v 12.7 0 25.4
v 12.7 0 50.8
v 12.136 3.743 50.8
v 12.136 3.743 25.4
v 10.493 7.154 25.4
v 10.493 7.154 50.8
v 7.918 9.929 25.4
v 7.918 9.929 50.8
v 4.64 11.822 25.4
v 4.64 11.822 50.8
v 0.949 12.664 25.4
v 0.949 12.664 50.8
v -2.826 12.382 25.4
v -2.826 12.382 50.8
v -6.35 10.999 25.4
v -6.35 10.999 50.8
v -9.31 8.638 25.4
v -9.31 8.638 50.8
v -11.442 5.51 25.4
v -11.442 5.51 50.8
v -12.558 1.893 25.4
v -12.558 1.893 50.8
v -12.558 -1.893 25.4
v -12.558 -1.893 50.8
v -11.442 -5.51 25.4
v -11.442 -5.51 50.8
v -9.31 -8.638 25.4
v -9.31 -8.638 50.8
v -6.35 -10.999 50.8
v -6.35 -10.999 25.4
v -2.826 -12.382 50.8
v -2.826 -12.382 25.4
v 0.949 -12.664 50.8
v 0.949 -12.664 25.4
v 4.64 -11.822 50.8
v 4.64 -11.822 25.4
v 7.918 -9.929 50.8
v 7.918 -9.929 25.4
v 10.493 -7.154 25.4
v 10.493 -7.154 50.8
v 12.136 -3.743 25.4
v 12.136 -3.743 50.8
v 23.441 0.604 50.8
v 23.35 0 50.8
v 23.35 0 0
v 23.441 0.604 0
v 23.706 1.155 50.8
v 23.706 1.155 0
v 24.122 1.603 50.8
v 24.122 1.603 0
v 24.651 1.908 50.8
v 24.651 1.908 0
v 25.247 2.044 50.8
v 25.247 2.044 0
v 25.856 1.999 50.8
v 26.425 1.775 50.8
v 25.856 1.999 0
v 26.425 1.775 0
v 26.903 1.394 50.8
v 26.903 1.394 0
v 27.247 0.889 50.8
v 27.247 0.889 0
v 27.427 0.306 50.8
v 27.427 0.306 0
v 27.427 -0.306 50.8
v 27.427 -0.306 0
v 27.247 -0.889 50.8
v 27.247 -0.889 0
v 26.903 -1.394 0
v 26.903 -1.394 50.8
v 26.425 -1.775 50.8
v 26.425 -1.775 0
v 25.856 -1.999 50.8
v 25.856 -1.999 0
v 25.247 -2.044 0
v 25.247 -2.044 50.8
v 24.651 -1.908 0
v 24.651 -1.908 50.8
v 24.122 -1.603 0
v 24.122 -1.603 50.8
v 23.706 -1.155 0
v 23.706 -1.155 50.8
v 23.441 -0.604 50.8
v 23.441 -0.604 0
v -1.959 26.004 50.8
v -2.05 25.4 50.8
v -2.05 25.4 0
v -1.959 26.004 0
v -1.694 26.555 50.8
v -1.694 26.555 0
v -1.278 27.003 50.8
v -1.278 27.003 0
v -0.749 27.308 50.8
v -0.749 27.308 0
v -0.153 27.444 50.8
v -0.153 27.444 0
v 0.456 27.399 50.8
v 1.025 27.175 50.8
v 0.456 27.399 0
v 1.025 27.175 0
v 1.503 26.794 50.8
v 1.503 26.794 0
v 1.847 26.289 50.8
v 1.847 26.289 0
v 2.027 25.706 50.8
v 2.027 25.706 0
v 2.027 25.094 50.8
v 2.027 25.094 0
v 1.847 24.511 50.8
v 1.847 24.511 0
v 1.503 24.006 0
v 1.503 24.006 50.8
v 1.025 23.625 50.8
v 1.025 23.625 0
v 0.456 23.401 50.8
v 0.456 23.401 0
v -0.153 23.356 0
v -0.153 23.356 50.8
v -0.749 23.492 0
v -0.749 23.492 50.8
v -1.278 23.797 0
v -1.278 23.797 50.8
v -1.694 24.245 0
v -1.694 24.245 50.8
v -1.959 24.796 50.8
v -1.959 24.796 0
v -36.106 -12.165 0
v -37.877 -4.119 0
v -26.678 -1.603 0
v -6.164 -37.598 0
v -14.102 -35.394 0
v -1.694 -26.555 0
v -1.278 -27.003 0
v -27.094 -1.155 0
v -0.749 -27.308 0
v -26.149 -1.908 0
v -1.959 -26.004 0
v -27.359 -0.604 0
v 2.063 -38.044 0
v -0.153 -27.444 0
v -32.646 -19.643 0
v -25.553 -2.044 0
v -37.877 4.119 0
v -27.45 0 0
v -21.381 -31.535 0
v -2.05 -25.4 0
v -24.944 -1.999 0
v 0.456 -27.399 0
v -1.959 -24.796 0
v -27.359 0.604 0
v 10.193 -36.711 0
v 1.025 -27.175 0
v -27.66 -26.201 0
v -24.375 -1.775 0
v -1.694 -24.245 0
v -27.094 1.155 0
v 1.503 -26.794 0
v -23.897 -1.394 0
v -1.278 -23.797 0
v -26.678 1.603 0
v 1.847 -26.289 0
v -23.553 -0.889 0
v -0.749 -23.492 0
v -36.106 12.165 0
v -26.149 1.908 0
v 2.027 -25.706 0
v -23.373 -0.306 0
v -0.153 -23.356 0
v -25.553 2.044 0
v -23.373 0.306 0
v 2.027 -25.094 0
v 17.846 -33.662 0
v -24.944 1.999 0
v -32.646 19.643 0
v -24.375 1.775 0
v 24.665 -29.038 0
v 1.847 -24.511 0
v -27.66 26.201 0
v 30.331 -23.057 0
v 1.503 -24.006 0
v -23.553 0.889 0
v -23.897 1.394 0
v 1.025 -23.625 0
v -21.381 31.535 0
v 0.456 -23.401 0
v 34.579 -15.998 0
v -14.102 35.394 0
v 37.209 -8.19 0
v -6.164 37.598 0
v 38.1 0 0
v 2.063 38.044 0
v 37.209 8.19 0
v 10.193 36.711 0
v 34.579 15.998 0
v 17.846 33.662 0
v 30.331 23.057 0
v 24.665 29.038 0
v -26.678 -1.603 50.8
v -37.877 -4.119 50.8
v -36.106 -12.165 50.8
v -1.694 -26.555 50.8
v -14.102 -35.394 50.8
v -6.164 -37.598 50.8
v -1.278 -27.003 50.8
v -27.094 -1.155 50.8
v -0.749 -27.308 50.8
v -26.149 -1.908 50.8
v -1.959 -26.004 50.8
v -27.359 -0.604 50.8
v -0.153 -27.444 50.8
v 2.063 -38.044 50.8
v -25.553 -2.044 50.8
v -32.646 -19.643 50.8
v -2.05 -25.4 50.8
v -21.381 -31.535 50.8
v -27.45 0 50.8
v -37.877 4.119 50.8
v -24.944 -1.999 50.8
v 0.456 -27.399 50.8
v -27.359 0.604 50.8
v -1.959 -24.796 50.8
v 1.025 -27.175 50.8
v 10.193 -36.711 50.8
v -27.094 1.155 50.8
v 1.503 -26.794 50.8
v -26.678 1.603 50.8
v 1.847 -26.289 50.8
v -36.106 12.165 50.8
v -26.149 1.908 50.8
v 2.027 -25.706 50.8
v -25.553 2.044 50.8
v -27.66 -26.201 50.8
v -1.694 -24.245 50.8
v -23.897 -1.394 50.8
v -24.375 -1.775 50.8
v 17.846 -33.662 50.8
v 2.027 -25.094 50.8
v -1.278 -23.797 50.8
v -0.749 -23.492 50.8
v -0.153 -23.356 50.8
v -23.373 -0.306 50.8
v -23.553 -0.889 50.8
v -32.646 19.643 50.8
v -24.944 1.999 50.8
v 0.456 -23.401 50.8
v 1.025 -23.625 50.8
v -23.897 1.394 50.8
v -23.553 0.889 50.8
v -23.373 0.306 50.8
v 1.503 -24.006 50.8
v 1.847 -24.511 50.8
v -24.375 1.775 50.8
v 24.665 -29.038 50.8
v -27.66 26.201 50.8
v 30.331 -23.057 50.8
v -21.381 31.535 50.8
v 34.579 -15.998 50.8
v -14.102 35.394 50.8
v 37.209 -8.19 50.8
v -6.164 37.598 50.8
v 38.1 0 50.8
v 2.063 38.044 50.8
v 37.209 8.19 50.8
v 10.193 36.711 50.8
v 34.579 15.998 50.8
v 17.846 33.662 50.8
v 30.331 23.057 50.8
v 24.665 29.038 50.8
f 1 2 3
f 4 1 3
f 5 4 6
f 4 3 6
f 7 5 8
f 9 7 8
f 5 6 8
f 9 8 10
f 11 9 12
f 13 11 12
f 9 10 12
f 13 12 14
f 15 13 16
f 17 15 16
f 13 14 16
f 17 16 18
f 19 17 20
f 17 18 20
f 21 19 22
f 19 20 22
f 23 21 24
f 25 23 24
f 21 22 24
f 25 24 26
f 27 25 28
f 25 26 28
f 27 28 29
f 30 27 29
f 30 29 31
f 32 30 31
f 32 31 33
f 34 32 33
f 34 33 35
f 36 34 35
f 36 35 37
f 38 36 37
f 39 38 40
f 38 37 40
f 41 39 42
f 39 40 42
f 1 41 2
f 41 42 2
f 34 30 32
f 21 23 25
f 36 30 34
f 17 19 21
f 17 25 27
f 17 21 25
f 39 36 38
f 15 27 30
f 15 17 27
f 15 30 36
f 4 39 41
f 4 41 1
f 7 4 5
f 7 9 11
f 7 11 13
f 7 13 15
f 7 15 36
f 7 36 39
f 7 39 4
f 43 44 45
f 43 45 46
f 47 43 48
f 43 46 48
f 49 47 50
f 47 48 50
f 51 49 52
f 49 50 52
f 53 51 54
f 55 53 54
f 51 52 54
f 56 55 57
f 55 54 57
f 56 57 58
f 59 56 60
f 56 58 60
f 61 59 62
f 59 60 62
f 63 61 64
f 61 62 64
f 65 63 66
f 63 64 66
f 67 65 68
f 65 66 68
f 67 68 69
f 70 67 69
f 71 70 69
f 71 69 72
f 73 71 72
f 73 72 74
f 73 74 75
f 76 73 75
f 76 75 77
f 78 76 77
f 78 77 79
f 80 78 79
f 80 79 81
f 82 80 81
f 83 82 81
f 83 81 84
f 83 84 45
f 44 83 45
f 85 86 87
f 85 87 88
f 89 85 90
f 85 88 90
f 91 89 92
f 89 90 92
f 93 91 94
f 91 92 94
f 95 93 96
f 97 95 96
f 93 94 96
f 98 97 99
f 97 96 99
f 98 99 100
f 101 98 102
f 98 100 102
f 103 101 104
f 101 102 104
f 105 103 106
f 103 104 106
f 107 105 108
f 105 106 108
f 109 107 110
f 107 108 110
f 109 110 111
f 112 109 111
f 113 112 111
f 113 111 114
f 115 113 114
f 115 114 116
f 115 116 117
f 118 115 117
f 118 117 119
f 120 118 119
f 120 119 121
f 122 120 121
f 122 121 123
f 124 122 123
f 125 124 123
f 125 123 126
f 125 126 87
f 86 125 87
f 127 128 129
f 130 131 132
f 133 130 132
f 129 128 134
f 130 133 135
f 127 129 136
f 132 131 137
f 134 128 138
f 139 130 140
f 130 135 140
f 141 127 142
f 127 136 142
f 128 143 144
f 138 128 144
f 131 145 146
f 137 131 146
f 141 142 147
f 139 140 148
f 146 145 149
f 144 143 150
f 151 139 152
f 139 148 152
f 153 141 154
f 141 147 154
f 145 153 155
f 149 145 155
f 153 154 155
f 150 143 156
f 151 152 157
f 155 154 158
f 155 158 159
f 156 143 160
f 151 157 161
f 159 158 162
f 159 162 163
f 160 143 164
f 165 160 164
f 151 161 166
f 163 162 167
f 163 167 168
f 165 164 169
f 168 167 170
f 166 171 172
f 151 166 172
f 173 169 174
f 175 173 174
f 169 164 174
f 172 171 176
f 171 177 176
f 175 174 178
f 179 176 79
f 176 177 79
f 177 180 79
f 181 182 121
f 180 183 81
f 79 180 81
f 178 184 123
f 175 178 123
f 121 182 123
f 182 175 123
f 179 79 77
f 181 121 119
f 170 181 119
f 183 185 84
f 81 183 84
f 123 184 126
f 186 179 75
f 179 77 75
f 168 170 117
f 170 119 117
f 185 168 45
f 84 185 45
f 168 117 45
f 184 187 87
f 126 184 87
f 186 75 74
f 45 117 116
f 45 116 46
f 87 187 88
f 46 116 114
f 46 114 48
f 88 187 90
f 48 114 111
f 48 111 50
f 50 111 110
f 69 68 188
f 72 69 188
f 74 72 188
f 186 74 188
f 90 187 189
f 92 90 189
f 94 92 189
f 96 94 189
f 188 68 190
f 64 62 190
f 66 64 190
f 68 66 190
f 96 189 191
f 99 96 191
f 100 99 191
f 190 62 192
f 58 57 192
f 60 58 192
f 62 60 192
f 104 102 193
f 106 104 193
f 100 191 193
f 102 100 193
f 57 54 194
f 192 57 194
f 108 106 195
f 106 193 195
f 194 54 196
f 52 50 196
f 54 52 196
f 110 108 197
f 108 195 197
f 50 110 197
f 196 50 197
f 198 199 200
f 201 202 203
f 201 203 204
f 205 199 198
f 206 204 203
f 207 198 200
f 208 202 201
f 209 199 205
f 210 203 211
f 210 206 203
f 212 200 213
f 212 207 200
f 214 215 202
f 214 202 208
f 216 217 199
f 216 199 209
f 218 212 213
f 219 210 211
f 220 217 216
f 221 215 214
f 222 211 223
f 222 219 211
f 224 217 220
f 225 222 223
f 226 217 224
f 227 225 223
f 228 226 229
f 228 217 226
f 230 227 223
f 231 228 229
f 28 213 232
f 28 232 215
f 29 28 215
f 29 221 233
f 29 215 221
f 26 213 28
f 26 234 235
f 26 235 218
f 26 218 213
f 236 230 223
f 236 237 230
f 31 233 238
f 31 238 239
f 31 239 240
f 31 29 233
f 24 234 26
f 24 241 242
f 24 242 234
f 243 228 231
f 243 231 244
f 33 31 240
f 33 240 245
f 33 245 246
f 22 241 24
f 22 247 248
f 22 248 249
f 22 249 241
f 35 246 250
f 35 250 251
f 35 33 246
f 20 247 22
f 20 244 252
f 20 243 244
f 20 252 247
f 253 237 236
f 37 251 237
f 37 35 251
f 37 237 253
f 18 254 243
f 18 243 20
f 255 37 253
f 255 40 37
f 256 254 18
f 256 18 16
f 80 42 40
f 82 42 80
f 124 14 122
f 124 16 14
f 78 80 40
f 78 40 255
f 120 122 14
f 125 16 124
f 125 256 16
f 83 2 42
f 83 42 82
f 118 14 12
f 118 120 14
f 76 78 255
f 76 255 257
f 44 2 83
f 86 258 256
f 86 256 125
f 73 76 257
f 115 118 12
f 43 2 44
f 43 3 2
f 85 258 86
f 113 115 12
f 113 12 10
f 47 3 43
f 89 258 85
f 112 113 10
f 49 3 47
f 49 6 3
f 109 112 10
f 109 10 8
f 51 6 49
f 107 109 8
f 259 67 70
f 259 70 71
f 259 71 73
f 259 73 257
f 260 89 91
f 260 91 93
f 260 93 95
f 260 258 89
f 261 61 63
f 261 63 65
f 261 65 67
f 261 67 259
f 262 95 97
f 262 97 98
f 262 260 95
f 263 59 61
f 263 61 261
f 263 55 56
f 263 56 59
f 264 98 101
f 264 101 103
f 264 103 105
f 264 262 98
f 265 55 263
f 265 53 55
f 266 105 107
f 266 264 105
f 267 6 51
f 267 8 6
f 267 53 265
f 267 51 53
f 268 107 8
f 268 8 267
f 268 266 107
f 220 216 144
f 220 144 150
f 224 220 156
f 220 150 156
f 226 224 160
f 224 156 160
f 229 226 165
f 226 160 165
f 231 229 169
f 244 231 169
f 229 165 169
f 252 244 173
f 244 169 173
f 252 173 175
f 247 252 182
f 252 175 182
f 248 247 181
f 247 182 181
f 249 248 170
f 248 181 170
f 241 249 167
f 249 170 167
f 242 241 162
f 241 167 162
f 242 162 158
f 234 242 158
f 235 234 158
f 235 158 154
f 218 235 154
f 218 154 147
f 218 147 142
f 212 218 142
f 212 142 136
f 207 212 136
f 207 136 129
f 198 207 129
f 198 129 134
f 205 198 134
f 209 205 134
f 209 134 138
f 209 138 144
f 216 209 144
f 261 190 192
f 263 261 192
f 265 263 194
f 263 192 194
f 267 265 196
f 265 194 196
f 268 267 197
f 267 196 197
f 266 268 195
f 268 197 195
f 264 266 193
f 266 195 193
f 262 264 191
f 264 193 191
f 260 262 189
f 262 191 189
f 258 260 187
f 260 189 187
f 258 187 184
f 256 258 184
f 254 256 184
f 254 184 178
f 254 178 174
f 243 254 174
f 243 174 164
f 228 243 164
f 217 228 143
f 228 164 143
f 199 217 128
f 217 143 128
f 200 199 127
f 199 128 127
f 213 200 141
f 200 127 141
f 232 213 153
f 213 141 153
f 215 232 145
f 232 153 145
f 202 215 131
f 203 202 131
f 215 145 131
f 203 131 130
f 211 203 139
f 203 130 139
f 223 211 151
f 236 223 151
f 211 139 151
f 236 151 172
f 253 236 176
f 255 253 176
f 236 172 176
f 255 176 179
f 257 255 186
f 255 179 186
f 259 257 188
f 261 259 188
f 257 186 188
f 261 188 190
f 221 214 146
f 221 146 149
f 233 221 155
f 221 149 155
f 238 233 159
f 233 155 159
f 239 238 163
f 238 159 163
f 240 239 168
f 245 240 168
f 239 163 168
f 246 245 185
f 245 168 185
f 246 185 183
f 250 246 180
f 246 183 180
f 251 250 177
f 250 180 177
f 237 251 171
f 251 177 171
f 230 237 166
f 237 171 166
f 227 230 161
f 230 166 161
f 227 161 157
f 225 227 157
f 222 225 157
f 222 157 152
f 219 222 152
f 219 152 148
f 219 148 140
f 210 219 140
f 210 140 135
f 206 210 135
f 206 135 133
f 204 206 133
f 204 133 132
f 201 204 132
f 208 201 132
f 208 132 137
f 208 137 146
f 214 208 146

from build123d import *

# Parameters (mm, degrees)
F0_R     = 38.1
F1_DEPTH = 50.8
F2_R     = 12.7
F3_DEPTH = 25.4
F5_D     = 4.1


with BuildPart() as f1:
    # F0 (on Top) → F1 (new body)
    with BuildSketch(Plane.XY):
        Circle(F0_R)
    extrude(amount=F1_DEPTH)

    # F2 (on face) → F3 (cut)
    with BuildSketch(Plane.XY.offset(50.8)):
        Circle(F2_R)
    extrude(amount=-F3_DEPTH, mode=Mode.SUBTRACT)

    # F5 (through all)
    with Locations(Plane.XY.offset(50.8)):
        with Locations((25.4, 0), (0, 25.4), (-25.4, 0), (0, -25.4)):
            Hole(F5_D / 2)


solid = f1.part
